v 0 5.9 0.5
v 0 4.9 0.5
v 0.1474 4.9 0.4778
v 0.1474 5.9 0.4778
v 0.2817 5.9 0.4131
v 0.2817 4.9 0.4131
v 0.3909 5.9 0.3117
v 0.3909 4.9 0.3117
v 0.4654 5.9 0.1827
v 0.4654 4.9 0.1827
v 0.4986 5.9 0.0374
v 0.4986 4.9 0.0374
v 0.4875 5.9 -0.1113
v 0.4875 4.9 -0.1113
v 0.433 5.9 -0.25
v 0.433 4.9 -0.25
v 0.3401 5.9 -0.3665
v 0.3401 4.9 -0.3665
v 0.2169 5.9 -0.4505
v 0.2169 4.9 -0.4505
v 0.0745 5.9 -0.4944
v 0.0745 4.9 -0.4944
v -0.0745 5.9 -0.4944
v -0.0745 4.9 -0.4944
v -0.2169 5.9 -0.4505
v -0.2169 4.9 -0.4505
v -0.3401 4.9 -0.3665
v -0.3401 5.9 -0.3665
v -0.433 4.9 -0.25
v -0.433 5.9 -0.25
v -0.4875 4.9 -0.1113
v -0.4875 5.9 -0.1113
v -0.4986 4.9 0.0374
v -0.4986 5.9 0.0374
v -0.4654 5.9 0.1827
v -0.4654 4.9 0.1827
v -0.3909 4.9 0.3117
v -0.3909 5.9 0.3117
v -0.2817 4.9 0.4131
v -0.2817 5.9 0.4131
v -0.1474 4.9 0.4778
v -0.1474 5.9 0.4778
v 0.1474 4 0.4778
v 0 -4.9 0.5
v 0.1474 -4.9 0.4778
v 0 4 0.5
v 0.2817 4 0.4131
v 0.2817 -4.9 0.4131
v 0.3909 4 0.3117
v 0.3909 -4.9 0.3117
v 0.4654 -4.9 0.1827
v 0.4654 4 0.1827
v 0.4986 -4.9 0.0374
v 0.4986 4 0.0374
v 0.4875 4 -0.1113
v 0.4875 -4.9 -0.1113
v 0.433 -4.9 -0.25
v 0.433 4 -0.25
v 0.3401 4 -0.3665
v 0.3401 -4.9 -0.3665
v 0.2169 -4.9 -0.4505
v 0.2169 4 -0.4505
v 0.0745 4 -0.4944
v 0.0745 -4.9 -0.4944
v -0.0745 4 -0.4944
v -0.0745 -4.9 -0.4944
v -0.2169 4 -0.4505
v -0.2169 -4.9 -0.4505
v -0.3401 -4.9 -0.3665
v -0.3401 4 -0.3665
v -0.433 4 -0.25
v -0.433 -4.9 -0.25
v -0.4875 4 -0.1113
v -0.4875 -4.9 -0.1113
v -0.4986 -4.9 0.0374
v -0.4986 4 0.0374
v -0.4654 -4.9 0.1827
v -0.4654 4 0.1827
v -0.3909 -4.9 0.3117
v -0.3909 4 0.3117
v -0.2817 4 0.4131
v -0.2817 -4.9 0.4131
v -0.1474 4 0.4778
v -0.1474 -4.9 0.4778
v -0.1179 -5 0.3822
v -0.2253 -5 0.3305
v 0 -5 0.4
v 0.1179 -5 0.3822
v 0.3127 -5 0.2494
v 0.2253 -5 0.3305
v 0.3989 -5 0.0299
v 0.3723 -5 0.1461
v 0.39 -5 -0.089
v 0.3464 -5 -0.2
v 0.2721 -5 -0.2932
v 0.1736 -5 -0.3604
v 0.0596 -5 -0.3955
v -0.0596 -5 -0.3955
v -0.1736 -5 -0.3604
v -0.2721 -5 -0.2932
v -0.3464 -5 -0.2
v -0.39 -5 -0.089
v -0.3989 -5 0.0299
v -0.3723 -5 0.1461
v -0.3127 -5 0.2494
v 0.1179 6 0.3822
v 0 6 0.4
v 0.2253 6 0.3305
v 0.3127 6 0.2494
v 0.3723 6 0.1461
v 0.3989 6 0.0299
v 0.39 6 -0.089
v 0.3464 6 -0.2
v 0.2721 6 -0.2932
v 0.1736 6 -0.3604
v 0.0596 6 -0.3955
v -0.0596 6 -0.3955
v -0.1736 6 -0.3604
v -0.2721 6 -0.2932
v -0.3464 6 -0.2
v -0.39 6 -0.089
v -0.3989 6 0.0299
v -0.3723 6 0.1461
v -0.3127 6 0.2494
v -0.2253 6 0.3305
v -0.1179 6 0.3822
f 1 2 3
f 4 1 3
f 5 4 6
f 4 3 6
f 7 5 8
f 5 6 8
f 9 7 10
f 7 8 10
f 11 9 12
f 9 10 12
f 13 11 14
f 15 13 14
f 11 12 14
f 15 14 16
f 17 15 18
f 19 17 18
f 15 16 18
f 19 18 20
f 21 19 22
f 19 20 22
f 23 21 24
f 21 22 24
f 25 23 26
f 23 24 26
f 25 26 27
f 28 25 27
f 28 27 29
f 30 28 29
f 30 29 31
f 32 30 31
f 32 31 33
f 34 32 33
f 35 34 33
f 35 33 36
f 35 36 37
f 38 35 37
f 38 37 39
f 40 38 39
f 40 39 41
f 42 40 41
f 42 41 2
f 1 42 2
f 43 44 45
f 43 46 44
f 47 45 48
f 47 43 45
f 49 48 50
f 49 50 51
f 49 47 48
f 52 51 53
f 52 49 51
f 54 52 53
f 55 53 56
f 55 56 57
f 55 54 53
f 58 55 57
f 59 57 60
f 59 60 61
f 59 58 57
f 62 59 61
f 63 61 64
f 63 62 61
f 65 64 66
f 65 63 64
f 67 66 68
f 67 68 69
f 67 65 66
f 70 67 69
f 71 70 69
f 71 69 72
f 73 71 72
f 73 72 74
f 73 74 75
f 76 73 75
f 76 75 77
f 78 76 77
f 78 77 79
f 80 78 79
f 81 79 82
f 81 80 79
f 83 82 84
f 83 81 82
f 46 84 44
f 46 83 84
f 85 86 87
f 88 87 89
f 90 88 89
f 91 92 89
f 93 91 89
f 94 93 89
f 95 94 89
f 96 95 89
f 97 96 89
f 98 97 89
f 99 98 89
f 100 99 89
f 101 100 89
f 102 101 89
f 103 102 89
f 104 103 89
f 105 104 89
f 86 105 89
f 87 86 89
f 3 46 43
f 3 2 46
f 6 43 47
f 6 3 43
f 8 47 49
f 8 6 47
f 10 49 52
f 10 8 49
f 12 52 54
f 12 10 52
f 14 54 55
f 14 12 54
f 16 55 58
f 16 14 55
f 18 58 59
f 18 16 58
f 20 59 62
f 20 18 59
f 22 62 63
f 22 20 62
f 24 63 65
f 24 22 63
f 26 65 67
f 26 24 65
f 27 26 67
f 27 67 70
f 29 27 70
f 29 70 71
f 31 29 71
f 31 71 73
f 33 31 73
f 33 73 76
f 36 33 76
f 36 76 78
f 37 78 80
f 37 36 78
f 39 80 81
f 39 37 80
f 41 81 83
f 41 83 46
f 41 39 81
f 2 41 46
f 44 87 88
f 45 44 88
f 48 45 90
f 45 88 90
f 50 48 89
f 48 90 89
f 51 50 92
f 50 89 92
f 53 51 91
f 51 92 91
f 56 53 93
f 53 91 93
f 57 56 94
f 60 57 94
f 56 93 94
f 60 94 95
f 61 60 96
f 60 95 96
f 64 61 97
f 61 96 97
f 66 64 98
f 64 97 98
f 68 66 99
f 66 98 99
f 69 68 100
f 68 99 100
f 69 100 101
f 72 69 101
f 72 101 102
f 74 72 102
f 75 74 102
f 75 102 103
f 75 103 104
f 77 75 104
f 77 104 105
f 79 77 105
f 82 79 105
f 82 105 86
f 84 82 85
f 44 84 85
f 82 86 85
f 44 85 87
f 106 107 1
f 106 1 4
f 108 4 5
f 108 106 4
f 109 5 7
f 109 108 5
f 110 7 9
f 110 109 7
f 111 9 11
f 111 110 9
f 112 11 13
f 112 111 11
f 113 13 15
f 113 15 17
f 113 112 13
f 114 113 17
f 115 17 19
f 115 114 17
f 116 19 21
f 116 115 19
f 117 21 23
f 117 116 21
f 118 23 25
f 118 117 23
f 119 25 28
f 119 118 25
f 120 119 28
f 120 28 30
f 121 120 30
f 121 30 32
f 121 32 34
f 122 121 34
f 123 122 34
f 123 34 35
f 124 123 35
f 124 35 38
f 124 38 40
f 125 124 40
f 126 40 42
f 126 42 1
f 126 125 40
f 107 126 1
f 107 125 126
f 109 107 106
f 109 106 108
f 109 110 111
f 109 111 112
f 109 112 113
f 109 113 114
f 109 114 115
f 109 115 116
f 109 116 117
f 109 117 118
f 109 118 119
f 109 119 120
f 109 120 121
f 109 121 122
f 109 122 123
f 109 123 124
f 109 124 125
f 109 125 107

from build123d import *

# Parameters (mm, degrees)
IZIM1_R                          = 0.5
Y_KSEKLIK_EKSTR_ZYON1_DEPTH      = 5
PAH1_SIZE                        = 0.1
Y_KSEKLIK_EKSTR_ZYON2_DEPTH      = 1
Y_KSEKLIK_EKSTR_ZYON2_DEPTH_BACK = 1
IZIM2_R                          = 0.5
PAH2_SIZE                        = 0.1


with BuildPart() as part:
    # Çizim1 → Yükseklik-Ekstrüzyon1 (new, symmetric)
    with BuildSketch(Plane(origin=(0, 0, 0), x_dir=(1, 0, 0), z_dir=(0, 1, 0))):
        with Locations(Location((0, 0, 0), (0, 0, 270))):
            Circle(IZIM1_R)
    extrude(amount=Y_KSEKLIK_EKSTR_ZYON1_DEPTH, both=True)

    # Pah1
    pah1_edges = [part.edges().sort_by_distance(p)[0] for p in [
        (0, -5, -0.5),
        (0, 5, -0.5),
    ]]
    chamfer(pah1_edges, length=PAH1_SIZE)

    # Çizim2 → Yükseklik-Ekstrüzyon2 (add, two sides: drawn at the far end of the back side and taken through both)
    with BuildSketch(Plane(origin=(0, 5, 0), x_dir=(1, 0, 0), z_dir=(0, 1, 0)).offset(-Y_KSEKLIK_EKSTR_ZYON2_DEPTH_BACK)):
        with Locations(Location((0, 0, 0), (0, 0, 270))):
            Circle(IZIM2_R)
    extrude(amount=Y_KSEKLIK_EKSTR_ZYON2_DEPTH + Y_KSEKLIK_EKSTR_ZYON2_DEPTH_BACK)

    # Pah2
    pah2_edges = [part.edges().sort_by_distance(p)[0] for p in [
        (0, 6, -0.5),
    ]]
    chamfer(pah2_edges, length=PAH2_SIZE)


solid = part.part
